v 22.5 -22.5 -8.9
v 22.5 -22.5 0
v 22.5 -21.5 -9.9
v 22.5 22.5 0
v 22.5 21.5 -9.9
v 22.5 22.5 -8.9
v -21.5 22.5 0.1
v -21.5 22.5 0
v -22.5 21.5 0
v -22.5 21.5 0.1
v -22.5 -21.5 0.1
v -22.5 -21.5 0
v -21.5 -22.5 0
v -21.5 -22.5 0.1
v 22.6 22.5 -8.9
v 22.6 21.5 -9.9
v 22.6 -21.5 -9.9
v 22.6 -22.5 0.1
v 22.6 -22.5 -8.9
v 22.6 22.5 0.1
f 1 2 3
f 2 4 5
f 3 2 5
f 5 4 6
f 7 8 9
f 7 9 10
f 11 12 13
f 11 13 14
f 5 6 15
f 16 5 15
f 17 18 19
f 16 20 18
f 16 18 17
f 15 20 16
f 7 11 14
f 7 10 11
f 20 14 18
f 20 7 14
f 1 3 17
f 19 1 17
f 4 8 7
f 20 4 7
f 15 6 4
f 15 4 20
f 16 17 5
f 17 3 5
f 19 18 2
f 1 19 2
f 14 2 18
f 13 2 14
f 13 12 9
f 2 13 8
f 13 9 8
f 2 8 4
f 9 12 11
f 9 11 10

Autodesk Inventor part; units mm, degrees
ref_plane "YZ Plane" through (0, 0, 0) normal (1, 0, 0) x (0, 1, 0)
ref_plane "XZ Plane" through (0, 0, 0) normal (0, 1, 0) x (-1, 0, 0)
ref_plane "XY Plane" through (0, 0, 0) normal (0, 0, 1) x (1, 0, 0)
sketch "Sketch1" plane through (0, 0, 0) normal (0, 0, 1) x (1, 0, 0)
  line L0 (22, -19) -> (22, 19) projected
  line L1 (-19, -22) -> (19, -22) projected
  line L2 (22.5, 22.5) -> (22.5, -22.5)
  line L3 (22.5, -22.5) -> (-22.5, -22.5)
  line L4 (-22.5, -22.5) -> (-22.5, 22.5)
  line L5 (-22.5, 22.5) -> (22.5, 22.5)
  line L6 (22.5, 22.5) -> (-22.5, -22.5) construction
  line L7 (22.5, -22.5) -> (-22.5, 22.5) construction
  point P0 (0, 0)
  dimension "d0" = 45
  dimension "d1" = 45
extrude "Extrusion1" add sketch "Sketch1" along normal blind 0.1
sketch "Sketch2" plane through (22.5, -22.5, 0) normal (1, 0, 0) x (0, 0, -1)
  line L0 (-0.1, 0) -> (-0.1, 45) projected
  line L1 (0, 0) -> (0, 45) projected
  line L2 (0, 45) -> (-0.1, 45) projected
  line L3 (-0.1, 0) -> (-0.1, 45) projected
  line L4 (0, 0) -> (-0.1, 0) projected
  line L5 (-0.1, 0) -> (9.9, 0)
  line L6 (9.9, 0) -> (9.9, 45)
  line L7 (9.9, 45) -> (-0.1, 45)
  line L8 (-0.1, 45) -> (-0.1, 0)
  point P0 (0, 22.5)
  dimension "d4" = 10
  dimension "d5" = 45
extrude "Extrusion2" add sketch "Sketch2" along normal blind 0.1
chamfer "Chamfer1" distance 1 angle 45 2 edges at (22.55, -22.5, -9.9) (22.55, 22.5, -9.9)
chamfer "Chamfer2" distance 1 angle 45 2 edges at (-22.5, 22.5, 0.05) (-22.5, -22.5, 0.05)
properties part number "tag"
